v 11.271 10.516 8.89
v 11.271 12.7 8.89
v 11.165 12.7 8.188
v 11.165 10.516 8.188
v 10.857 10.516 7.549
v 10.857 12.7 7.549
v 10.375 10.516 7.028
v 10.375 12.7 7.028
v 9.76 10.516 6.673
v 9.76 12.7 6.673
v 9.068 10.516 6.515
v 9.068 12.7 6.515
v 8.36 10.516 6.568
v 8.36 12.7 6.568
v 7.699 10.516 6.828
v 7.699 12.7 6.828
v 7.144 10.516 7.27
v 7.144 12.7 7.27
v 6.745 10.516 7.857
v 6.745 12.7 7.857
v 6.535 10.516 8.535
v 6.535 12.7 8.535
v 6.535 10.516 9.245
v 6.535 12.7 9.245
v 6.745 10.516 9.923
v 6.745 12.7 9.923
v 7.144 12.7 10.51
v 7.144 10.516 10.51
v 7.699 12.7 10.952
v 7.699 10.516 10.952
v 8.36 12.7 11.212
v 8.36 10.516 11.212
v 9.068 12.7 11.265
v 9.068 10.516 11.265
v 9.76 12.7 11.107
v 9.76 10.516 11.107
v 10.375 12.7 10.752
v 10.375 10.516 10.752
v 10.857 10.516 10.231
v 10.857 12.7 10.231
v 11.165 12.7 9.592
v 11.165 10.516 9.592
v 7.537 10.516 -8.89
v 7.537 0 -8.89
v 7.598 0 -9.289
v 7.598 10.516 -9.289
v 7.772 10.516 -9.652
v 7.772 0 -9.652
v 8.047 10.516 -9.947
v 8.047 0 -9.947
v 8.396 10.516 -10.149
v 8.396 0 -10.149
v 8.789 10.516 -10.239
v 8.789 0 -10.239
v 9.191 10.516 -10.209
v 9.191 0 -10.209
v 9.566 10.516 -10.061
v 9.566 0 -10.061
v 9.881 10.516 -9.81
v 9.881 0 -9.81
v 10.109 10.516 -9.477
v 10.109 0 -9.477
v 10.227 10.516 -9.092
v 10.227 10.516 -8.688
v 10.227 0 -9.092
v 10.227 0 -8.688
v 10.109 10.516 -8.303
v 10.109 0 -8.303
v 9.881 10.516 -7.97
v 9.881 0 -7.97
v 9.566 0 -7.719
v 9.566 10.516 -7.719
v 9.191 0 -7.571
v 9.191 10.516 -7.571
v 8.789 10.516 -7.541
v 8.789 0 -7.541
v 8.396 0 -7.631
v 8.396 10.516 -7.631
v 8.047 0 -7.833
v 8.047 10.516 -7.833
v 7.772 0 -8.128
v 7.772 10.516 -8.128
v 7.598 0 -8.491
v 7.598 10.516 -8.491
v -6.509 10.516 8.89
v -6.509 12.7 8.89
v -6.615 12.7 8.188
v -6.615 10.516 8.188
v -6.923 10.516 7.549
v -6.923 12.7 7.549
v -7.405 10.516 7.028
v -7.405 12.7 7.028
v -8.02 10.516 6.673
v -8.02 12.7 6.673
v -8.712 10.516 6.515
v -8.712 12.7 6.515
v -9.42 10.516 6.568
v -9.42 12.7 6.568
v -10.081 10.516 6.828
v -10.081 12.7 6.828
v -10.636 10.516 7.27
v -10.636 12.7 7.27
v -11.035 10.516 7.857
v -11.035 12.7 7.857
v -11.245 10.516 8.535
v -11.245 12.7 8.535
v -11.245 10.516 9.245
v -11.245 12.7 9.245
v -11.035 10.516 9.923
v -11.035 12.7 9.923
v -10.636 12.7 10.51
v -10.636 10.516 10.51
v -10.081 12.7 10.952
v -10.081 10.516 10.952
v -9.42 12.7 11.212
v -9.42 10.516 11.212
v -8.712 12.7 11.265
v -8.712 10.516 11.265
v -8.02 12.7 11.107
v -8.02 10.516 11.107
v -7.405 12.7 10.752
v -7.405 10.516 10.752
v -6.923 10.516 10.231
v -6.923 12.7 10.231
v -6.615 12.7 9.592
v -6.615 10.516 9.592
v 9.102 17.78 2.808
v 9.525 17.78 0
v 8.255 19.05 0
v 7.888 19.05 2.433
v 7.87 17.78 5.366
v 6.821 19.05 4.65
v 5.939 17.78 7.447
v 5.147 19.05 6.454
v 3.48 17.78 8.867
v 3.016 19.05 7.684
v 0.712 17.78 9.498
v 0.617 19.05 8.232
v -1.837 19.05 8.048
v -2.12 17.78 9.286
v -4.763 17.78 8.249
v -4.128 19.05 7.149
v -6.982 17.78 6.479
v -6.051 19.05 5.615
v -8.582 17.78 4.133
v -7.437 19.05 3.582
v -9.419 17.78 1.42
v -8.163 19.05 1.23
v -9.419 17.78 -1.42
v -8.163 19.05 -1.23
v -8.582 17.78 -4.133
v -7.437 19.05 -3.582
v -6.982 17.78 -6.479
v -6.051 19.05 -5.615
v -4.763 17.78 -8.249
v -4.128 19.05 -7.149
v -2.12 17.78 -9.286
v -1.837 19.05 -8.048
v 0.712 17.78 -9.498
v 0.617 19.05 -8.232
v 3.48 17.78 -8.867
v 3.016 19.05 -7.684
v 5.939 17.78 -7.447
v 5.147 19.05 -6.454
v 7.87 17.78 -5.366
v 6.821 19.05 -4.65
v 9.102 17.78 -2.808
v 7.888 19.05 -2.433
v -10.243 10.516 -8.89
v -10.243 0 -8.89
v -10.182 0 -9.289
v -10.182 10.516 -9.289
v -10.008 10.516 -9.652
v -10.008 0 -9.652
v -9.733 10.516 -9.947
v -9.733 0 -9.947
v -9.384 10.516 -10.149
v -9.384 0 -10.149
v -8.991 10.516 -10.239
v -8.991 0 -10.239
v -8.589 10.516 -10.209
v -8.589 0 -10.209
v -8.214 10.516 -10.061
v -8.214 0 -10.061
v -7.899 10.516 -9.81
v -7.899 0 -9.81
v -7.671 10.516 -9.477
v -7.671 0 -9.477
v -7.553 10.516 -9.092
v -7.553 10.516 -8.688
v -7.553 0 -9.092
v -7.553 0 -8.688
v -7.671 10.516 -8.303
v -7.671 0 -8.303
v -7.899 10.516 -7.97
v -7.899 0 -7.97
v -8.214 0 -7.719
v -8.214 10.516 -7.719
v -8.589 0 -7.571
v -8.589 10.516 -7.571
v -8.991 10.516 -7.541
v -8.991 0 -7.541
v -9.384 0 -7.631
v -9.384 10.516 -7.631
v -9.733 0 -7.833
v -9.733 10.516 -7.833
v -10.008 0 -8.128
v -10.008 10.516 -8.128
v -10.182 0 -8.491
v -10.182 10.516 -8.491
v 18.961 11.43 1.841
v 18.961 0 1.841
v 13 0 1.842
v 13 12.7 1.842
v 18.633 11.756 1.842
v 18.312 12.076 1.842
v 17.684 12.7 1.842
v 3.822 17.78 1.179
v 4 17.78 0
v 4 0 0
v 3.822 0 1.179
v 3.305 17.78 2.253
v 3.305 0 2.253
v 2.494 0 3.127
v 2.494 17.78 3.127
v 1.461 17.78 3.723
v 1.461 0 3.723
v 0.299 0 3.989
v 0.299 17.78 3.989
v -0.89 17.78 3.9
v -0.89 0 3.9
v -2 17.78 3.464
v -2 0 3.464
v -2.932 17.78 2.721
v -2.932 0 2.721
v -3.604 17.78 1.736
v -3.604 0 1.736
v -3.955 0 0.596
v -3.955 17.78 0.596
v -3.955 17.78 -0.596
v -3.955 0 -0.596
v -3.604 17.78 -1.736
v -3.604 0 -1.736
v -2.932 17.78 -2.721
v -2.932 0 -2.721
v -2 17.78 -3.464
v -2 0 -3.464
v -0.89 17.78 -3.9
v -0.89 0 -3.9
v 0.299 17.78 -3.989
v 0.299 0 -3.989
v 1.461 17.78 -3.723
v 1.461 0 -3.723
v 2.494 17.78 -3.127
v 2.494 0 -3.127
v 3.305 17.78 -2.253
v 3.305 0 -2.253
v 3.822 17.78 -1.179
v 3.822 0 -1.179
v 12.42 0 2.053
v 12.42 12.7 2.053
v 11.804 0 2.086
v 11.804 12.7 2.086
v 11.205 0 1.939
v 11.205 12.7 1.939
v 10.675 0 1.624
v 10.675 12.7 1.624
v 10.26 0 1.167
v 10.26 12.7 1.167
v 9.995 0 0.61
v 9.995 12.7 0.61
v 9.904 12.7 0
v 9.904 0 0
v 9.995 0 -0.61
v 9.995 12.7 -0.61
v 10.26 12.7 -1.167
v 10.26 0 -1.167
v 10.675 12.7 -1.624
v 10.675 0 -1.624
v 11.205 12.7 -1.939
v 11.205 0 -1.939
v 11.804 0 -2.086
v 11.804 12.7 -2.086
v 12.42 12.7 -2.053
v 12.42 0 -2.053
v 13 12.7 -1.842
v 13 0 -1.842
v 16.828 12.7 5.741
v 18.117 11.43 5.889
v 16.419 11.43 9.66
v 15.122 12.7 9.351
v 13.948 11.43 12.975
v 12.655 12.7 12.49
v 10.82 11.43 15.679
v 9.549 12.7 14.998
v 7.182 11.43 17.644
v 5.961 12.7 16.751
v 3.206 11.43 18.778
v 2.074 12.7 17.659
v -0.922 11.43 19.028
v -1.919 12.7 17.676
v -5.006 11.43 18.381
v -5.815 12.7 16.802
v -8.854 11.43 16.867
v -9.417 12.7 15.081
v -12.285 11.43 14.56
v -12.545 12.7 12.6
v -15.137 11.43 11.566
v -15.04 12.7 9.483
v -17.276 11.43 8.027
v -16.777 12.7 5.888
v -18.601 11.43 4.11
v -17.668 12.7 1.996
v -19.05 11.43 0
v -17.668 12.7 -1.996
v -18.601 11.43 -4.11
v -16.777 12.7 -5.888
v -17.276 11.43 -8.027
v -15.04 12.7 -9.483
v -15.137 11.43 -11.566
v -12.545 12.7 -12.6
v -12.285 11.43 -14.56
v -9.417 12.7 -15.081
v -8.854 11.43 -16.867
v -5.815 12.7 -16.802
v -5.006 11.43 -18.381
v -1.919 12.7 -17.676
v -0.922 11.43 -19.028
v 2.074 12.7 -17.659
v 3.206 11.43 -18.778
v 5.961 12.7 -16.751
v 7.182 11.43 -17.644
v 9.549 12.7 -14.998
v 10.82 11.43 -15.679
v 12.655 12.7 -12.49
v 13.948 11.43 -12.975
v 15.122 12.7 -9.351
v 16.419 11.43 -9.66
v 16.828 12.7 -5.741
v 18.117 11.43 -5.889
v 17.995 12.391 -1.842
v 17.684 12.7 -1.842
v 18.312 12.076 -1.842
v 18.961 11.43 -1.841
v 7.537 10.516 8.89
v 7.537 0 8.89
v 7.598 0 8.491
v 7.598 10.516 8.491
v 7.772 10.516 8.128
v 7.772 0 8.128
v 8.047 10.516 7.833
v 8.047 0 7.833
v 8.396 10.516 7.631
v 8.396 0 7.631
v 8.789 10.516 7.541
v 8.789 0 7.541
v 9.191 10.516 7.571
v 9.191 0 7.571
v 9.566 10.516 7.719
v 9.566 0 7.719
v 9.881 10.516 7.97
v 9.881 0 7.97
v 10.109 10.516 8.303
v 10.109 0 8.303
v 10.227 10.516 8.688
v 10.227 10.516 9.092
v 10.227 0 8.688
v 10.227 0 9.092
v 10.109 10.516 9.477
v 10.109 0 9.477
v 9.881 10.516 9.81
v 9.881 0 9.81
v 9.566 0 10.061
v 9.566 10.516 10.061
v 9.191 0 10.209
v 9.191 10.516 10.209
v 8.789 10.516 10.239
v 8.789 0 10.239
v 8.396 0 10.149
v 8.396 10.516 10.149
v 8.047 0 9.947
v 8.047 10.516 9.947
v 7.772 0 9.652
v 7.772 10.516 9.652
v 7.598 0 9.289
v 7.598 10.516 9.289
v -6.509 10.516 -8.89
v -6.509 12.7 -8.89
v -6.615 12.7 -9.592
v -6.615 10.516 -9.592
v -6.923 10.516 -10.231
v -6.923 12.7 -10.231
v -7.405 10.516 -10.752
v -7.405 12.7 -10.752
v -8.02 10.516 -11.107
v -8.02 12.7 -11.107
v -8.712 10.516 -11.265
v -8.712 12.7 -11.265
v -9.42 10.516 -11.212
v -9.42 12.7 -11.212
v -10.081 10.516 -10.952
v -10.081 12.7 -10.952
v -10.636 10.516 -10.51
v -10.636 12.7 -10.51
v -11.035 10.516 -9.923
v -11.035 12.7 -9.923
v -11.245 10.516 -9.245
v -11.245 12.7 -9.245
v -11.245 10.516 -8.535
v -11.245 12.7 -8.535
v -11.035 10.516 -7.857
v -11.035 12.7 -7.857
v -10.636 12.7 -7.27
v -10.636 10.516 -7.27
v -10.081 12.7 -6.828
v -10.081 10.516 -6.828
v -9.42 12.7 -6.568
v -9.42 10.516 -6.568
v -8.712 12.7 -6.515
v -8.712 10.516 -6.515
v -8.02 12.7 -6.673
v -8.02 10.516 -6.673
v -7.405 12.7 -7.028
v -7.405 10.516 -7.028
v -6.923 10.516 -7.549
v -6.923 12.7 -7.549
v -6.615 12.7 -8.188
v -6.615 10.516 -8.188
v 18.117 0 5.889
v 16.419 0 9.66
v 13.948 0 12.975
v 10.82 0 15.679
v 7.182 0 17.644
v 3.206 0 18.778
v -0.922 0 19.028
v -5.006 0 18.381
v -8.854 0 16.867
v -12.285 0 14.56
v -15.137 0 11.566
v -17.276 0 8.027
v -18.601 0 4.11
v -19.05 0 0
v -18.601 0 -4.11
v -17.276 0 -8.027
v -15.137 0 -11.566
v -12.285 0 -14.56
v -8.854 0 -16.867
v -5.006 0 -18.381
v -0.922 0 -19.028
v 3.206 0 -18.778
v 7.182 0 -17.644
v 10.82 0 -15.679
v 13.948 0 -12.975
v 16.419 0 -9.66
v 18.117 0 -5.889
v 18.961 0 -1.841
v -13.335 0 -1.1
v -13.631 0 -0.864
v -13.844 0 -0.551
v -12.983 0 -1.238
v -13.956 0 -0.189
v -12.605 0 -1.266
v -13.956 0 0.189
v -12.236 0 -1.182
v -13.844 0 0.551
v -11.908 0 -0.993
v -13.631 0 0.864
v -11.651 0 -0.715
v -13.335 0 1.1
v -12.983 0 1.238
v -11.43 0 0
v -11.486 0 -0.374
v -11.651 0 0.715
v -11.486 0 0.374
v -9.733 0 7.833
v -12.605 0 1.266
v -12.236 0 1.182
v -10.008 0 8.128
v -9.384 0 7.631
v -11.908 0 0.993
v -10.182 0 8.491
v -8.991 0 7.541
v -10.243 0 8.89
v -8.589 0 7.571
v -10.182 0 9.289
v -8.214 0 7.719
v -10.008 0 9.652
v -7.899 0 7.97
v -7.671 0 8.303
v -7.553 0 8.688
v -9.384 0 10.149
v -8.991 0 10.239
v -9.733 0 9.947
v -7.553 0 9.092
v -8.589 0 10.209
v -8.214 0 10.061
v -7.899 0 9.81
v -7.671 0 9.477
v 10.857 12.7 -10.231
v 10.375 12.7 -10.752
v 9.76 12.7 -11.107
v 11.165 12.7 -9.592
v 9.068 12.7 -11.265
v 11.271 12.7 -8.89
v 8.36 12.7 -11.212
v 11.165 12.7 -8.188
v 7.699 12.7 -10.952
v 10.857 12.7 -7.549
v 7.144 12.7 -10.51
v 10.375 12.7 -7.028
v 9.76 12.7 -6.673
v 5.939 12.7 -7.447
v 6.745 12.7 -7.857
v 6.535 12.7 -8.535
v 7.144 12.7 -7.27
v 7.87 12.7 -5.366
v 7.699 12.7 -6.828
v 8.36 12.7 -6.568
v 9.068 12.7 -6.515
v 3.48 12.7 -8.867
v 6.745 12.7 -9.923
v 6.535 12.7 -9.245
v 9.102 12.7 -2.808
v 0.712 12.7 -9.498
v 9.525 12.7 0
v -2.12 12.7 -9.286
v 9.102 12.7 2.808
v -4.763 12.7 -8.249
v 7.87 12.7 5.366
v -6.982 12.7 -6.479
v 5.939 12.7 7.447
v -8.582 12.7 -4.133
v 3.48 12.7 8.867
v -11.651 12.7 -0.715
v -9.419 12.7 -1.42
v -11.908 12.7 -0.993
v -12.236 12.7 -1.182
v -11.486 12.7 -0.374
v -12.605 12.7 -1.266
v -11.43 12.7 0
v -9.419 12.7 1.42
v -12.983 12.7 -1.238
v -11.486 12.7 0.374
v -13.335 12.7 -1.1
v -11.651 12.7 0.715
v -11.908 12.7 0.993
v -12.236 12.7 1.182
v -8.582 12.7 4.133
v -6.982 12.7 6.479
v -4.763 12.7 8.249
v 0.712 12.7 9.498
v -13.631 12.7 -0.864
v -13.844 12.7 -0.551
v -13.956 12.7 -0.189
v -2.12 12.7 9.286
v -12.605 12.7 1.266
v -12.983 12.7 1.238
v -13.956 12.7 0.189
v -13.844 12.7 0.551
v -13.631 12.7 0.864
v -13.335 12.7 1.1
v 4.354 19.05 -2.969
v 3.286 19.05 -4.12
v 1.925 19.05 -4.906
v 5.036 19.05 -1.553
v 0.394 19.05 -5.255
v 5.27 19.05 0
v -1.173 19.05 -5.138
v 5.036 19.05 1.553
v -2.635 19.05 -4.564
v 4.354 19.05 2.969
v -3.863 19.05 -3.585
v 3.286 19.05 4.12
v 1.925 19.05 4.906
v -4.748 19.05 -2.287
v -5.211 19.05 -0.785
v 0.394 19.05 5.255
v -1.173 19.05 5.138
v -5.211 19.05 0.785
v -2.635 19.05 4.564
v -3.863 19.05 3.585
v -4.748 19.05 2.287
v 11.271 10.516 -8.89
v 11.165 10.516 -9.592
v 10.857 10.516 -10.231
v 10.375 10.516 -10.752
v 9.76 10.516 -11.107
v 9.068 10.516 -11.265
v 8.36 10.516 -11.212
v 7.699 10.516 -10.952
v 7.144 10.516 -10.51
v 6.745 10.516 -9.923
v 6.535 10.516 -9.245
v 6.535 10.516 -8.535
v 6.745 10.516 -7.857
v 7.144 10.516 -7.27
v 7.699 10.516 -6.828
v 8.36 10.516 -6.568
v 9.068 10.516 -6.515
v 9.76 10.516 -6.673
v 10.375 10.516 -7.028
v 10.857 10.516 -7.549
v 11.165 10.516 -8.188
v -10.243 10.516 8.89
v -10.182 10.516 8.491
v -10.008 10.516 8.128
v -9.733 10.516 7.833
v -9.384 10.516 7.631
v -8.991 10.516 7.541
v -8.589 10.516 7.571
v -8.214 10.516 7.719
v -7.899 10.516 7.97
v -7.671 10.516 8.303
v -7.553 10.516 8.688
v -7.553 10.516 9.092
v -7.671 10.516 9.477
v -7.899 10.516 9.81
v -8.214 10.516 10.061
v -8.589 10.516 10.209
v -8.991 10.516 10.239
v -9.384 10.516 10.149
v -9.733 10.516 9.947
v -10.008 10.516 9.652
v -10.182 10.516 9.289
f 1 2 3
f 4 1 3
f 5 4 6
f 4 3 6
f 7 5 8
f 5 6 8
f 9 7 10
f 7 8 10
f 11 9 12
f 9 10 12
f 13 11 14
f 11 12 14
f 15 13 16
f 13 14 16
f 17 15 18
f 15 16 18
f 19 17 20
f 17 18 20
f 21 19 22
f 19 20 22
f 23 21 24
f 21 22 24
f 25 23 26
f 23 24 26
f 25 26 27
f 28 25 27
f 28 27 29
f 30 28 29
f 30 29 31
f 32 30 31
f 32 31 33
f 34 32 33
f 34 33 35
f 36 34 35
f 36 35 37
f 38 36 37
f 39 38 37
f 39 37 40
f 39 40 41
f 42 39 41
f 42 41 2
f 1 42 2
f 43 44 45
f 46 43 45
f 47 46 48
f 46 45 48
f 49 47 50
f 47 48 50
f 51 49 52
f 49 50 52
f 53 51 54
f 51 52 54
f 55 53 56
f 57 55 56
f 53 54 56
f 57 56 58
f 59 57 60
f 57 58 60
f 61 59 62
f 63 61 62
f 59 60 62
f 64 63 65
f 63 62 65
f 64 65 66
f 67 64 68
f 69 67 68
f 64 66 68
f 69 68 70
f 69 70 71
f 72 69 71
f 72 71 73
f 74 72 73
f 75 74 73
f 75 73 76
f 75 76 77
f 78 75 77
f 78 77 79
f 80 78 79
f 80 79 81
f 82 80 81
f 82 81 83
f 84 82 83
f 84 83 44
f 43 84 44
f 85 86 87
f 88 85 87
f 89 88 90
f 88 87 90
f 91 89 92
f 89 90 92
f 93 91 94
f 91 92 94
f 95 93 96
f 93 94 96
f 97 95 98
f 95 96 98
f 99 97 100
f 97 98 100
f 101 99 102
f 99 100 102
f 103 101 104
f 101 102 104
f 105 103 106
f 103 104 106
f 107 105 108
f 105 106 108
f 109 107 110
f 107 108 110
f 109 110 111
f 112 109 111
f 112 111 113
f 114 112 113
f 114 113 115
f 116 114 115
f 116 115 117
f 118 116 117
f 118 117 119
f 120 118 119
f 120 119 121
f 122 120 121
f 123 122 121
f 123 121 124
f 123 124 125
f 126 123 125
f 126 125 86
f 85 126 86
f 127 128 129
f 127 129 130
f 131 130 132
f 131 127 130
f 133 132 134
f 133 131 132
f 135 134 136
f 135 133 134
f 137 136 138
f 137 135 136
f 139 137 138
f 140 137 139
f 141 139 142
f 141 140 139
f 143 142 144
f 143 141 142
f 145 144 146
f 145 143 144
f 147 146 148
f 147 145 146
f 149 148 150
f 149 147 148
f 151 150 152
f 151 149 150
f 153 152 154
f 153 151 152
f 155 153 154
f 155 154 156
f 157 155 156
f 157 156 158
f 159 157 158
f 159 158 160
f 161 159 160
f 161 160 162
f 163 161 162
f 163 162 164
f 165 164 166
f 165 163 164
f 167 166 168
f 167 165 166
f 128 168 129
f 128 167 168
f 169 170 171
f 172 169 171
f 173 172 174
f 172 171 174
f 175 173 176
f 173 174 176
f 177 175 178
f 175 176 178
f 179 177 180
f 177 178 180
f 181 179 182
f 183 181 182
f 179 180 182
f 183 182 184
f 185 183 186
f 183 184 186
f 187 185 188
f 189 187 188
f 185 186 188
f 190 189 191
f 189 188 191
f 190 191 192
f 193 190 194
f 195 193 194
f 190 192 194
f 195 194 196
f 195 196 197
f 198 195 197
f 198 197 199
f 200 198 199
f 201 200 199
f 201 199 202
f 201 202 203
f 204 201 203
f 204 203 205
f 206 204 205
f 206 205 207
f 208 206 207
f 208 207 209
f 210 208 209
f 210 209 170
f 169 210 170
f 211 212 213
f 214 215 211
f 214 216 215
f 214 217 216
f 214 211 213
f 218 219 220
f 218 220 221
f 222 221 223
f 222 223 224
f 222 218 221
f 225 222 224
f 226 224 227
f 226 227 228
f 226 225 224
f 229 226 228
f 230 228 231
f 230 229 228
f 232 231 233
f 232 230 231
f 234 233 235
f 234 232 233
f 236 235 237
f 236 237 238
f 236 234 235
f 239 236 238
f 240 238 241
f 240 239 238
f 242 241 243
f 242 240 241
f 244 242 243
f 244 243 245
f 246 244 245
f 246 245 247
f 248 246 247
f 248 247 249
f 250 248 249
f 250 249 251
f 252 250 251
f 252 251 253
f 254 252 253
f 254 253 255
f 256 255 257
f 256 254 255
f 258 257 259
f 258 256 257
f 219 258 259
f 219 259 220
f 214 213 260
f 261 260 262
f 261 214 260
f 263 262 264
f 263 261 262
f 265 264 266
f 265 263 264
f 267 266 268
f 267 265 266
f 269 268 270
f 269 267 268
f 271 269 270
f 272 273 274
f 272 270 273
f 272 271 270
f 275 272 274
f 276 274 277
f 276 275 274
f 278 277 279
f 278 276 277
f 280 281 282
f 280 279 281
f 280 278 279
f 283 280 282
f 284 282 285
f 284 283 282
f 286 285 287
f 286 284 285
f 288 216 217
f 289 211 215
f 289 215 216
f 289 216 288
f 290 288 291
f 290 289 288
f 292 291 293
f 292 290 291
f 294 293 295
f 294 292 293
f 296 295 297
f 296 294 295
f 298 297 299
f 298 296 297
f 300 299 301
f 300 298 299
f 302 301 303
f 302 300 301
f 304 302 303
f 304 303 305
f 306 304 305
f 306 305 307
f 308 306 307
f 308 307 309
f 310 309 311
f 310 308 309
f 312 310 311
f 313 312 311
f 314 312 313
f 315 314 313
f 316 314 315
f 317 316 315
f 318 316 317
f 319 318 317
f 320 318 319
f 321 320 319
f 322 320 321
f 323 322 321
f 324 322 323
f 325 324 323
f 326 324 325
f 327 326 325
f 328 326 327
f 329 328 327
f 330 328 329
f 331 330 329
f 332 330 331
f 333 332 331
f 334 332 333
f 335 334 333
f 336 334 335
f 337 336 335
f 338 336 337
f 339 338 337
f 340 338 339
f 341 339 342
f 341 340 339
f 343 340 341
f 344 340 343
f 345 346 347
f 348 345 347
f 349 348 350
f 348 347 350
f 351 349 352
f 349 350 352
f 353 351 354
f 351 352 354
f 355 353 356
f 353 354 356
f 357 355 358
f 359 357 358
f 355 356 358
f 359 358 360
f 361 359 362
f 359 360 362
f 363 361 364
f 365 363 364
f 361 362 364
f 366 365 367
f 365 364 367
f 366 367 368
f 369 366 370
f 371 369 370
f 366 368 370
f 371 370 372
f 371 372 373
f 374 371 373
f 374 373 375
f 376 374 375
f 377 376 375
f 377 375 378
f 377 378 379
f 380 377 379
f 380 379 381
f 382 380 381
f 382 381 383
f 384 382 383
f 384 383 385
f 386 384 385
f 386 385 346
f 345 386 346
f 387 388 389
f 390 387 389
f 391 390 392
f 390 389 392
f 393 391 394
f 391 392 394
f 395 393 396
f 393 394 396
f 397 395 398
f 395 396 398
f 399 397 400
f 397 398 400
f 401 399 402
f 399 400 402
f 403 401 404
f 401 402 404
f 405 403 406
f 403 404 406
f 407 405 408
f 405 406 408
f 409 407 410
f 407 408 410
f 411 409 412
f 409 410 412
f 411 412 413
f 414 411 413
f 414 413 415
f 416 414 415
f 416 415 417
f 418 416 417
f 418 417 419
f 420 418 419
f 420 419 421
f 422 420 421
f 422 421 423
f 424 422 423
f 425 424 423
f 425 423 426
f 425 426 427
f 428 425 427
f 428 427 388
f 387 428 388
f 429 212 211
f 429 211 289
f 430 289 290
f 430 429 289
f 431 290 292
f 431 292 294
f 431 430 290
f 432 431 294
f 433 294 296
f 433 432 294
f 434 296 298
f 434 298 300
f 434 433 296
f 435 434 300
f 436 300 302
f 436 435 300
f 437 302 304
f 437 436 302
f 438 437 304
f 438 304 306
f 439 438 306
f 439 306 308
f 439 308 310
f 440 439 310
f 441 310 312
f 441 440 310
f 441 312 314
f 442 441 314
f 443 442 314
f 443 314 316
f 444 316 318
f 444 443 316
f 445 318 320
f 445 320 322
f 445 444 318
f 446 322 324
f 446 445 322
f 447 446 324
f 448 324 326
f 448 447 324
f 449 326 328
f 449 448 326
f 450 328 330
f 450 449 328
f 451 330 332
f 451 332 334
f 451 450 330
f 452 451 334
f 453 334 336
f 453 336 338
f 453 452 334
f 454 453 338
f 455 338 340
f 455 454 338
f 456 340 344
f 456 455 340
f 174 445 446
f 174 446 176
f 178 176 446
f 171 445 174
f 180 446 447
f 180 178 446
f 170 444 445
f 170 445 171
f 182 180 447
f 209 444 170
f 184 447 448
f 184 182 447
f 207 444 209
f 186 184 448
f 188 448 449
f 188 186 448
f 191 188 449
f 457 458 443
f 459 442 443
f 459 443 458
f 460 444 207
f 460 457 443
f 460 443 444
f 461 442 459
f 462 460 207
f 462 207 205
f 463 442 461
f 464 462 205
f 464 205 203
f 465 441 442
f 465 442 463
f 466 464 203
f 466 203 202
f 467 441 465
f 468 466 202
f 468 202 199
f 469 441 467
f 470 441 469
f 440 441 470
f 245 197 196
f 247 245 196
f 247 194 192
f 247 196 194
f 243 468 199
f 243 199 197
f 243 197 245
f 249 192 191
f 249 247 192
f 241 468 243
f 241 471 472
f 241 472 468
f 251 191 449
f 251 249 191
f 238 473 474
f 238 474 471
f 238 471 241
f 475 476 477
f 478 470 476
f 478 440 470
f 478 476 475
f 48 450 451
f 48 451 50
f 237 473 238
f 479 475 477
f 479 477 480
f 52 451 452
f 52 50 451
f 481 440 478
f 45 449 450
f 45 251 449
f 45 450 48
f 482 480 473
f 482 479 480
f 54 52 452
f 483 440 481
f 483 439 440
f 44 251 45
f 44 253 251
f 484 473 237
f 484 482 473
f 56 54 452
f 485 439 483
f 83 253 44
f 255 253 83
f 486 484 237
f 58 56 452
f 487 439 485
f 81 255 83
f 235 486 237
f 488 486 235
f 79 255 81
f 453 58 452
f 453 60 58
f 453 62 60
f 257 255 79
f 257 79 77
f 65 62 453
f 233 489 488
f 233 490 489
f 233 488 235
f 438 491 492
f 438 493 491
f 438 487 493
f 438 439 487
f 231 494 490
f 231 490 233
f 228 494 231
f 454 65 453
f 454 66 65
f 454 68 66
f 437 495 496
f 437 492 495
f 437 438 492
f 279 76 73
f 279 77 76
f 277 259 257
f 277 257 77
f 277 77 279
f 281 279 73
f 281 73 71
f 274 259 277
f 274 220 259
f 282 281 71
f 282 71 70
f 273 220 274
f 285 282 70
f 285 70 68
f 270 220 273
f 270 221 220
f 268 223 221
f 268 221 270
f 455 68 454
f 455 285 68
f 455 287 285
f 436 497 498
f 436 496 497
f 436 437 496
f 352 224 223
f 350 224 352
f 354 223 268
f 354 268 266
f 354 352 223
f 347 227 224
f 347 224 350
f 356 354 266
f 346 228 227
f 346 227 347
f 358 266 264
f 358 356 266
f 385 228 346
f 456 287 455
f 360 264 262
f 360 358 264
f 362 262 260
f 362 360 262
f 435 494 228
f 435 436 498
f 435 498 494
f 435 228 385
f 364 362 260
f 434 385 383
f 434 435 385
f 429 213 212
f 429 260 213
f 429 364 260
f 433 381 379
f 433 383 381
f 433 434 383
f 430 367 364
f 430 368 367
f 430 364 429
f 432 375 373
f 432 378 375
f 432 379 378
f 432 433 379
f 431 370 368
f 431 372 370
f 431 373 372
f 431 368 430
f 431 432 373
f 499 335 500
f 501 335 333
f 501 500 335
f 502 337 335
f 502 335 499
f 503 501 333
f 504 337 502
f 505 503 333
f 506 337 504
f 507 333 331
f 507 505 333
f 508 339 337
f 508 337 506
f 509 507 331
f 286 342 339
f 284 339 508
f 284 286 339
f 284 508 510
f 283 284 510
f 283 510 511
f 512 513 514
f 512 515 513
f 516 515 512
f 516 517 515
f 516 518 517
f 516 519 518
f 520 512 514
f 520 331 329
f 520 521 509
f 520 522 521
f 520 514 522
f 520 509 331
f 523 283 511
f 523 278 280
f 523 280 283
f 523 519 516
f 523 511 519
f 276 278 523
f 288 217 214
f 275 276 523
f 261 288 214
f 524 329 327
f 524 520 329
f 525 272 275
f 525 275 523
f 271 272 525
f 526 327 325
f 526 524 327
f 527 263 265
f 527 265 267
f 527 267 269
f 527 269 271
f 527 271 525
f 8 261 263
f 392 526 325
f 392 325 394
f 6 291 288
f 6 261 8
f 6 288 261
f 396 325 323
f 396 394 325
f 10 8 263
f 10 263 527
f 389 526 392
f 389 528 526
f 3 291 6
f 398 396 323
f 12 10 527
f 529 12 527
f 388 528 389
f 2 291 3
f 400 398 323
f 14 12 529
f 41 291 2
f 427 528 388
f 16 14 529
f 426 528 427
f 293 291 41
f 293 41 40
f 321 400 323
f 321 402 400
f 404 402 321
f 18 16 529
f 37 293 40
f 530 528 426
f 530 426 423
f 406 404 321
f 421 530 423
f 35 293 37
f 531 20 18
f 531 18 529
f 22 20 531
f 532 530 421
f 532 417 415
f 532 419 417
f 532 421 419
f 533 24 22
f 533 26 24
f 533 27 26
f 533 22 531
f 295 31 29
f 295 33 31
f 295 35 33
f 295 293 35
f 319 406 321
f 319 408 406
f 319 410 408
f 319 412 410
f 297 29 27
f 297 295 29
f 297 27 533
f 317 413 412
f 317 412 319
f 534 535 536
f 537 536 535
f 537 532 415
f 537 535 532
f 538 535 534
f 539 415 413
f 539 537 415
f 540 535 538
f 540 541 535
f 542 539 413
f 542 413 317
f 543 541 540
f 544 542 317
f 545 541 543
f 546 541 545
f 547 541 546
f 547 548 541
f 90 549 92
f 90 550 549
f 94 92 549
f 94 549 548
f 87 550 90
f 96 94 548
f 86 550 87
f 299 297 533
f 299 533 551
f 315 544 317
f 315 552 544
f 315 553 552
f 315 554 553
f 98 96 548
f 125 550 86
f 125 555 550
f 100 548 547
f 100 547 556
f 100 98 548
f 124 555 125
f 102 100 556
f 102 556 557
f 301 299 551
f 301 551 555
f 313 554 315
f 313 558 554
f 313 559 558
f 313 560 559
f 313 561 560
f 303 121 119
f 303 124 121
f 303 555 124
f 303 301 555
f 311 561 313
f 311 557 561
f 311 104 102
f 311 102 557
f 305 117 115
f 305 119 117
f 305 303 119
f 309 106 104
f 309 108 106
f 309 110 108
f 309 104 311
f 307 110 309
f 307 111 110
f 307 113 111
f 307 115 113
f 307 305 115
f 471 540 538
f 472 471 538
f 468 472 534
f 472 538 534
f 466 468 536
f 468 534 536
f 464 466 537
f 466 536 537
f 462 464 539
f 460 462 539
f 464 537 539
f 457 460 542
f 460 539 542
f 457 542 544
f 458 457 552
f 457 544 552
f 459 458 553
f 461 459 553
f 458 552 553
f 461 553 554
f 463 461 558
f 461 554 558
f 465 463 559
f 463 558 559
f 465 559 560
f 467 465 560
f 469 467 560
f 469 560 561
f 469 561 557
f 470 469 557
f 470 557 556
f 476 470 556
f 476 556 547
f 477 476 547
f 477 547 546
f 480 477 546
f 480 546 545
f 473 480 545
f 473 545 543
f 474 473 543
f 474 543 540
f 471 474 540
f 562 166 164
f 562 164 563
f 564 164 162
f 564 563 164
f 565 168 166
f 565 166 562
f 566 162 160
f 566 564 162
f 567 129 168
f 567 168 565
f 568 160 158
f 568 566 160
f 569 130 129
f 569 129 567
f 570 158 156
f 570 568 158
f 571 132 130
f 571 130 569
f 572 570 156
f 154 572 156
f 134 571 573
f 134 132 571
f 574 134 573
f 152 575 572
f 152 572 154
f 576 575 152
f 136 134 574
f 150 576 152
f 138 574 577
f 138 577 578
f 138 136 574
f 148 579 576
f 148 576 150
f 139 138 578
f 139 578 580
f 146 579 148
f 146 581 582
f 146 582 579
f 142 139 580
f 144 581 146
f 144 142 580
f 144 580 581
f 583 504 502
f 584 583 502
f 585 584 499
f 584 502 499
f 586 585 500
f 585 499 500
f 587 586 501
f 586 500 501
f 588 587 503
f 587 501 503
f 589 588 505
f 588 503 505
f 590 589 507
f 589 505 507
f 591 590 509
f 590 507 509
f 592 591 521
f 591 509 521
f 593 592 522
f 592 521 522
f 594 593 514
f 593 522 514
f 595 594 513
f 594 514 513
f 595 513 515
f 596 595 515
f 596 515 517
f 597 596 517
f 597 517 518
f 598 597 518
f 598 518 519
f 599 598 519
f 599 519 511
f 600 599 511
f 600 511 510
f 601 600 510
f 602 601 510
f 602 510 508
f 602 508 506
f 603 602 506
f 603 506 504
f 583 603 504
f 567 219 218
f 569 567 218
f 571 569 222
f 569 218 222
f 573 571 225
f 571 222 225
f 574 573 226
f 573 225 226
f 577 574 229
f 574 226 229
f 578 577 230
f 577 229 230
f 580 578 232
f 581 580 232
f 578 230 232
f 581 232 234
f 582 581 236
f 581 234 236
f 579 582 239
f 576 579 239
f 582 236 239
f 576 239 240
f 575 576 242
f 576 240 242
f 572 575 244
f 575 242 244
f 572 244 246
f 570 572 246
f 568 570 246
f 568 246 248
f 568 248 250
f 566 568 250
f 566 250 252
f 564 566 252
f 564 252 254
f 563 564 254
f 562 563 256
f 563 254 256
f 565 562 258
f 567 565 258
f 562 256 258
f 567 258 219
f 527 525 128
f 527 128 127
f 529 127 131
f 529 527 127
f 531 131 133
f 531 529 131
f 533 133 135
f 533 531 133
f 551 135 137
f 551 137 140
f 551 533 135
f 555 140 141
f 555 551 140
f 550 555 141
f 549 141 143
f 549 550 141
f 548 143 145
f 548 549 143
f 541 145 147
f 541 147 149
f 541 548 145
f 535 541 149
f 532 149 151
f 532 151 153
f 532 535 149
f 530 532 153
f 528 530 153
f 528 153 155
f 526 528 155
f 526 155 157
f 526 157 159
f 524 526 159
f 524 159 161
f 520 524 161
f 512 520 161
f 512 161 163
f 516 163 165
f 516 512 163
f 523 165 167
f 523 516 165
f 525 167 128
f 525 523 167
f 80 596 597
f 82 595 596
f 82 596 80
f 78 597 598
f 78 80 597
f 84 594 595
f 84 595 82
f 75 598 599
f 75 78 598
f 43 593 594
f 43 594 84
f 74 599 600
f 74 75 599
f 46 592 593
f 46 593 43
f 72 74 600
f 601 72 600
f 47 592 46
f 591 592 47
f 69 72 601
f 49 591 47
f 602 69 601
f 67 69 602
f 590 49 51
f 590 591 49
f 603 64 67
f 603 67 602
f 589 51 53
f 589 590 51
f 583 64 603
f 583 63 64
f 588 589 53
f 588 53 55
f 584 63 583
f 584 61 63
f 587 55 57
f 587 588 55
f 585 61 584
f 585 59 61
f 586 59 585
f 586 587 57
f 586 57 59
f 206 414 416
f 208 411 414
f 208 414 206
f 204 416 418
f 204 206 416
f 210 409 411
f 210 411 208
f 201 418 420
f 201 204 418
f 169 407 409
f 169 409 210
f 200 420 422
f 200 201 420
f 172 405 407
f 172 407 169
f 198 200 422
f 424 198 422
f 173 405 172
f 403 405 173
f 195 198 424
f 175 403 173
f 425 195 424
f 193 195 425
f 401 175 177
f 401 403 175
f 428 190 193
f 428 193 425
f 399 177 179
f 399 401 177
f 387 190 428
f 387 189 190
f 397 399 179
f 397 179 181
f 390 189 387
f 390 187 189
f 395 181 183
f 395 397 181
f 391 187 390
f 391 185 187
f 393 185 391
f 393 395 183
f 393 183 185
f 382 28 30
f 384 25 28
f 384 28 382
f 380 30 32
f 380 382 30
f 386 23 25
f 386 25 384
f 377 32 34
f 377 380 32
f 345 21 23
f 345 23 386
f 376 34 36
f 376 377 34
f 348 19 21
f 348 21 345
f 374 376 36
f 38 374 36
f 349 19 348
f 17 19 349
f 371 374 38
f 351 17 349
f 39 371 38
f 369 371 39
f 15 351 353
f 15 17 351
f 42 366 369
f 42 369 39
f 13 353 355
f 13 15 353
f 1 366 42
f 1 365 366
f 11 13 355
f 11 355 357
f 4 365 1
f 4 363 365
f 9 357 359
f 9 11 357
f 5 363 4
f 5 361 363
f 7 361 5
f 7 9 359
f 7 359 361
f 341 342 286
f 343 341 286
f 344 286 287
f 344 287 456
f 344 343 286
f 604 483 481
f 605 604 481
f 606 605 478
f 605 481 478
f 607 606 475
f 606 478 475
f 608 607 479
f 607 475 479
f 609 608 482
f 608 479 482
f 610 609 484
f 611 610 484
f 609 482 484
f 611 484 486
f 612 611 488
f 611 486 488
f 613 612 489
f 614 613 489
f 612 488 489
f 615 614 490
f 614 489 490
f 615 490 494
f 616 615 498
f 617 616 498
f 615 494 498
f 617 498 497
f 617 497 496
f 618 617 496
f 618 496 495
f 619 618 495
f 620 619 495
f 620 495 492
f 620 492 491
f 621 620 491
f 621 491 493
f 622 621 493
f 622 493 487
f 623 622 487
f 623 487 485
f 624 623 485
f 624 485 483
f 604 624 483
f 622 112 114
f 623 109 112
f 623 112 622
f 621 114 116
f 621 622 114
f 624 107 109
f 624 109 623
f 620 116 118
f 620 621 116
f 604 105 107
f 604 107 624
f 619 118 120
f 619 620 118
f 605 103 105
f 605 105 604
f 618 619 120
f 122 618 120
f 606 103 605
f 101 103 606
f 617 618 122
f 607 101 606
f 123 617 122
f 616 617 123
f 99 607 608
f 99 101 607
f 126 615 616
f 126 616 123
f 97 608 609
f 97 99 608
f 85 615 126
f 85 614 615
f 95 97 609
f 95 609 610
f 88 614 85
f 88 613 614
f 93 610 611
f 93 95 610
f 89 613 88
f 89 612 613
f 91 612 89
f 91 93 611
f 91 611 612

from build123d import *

# Parameters (mm, degrees)
CHAMFER1_SIZE                                  = 1.27
CBORE_FOR_2_SOCKET_HEAD_CAP_SCREW1_D           = 2.7051
CBORE_FOR_2_SOCKET_HEAD_CAP_SCREW1_DEPTH       = 12.7
CBORE_FOR_2_SOCKET_HEAD_CAP_SCREW1_CBORE_D     = 4.7625
CBORE_FOR_2_SOCKET_HEAD_CAP_SCREW1_CBORE_DEPTH = 2.1844
CUT_EXTRUDE1_DEPTH                             = 13.7
SKETCH7_R                                      = 1.27
CUT_EXTRUDE2_DEPTH                             = 13.7


with BuildPart() as part:
    # Sketch1 → Revolve1 (revolve)
    with BuildSketch(Plane.XY):
        Polygon((4, 19.05), (9.525, 19.05), (9.525, 12.7), (19.05, 12.7), (19.05, 0), (4, 0), align=None)
    revolve(axis=Axis((0, 24.600281955, 0), (0, -1, 0)))

    # Chamfer1
    chamfer1_edges = [part.edges().sort_by_distance(p)[0] for p in [
        (-19.05, 12.7, 0),
        (-9.525, 19.05, 0),
        (-4, 19.05, 0),
    ]]
    chamfer(chamfer1_edges, length=CHAMFER1_SIZE)

    # CBORE for #2 Socket Head Cap Screw1
    with Locations(Plane(origin=(0, 12.7, 0), x_dir=(1, 0, 0), z_dir=(0, 1, 0))):
        with Locations((-8.89, -8.89), (8.89, -8.89), (8.89, 8.89), (-8.89, 8.89)):
            CounterBoreHole(CBORE_FOR_2_SOCKET_HEAD_CAP_SCREW1_D / 2, CBORE_FOR_2_SOCKET_HEAD_CAP_SCREW1_CBORE_D / 2, CBORE_FOR_2_SOCKET_HEAD_CAP_SCREW1_CBORE_DEPTH, depth=CBORE_FOR_2_SOCKET_HEAD_CAP_SCREW1_DEPTH)

    # Sketch6 → Cut-Extrude1 (cut, through all)
    with BuildSketch(Plane(origin=(0, 12.7, 0), x_dir=(1, 0, 0), z_dir=(0, 1, 0))):
        with BuildLine():
            Line((12.999999, 1.8415), (18.960785262, 1.8415))
            ThreePointArc((18.960785262, 1.8415), (19.05, 0), (18.960785262, -1.8415))
            Line((18.960785262, -1.8415), (12.999999, -1.8415))
            ThreePointArc((12.999999, -1.8415), (9.9045, 0), (12.999999, 1.8415))
        make_face()
    extrude(amount=-CUT_EXTRUDE1_DEPTH, mode=Mode.SUBTRACT)

    # Sketch7 → Cut-Extrude2 (cut, through all)
    with BuildSketch(Plane(origin=(0, 12.7, 0), x_dir=(1, 0, 0), z_dir=(0, 1, 0))):
        with Locations((-12.7, 0)):
            Circle(SKETCH7_R)
    extrude(amount=-CUT_EXTRUDE2_DEPTH, mode=Mode.SUBTRACT)


solid = part.part
